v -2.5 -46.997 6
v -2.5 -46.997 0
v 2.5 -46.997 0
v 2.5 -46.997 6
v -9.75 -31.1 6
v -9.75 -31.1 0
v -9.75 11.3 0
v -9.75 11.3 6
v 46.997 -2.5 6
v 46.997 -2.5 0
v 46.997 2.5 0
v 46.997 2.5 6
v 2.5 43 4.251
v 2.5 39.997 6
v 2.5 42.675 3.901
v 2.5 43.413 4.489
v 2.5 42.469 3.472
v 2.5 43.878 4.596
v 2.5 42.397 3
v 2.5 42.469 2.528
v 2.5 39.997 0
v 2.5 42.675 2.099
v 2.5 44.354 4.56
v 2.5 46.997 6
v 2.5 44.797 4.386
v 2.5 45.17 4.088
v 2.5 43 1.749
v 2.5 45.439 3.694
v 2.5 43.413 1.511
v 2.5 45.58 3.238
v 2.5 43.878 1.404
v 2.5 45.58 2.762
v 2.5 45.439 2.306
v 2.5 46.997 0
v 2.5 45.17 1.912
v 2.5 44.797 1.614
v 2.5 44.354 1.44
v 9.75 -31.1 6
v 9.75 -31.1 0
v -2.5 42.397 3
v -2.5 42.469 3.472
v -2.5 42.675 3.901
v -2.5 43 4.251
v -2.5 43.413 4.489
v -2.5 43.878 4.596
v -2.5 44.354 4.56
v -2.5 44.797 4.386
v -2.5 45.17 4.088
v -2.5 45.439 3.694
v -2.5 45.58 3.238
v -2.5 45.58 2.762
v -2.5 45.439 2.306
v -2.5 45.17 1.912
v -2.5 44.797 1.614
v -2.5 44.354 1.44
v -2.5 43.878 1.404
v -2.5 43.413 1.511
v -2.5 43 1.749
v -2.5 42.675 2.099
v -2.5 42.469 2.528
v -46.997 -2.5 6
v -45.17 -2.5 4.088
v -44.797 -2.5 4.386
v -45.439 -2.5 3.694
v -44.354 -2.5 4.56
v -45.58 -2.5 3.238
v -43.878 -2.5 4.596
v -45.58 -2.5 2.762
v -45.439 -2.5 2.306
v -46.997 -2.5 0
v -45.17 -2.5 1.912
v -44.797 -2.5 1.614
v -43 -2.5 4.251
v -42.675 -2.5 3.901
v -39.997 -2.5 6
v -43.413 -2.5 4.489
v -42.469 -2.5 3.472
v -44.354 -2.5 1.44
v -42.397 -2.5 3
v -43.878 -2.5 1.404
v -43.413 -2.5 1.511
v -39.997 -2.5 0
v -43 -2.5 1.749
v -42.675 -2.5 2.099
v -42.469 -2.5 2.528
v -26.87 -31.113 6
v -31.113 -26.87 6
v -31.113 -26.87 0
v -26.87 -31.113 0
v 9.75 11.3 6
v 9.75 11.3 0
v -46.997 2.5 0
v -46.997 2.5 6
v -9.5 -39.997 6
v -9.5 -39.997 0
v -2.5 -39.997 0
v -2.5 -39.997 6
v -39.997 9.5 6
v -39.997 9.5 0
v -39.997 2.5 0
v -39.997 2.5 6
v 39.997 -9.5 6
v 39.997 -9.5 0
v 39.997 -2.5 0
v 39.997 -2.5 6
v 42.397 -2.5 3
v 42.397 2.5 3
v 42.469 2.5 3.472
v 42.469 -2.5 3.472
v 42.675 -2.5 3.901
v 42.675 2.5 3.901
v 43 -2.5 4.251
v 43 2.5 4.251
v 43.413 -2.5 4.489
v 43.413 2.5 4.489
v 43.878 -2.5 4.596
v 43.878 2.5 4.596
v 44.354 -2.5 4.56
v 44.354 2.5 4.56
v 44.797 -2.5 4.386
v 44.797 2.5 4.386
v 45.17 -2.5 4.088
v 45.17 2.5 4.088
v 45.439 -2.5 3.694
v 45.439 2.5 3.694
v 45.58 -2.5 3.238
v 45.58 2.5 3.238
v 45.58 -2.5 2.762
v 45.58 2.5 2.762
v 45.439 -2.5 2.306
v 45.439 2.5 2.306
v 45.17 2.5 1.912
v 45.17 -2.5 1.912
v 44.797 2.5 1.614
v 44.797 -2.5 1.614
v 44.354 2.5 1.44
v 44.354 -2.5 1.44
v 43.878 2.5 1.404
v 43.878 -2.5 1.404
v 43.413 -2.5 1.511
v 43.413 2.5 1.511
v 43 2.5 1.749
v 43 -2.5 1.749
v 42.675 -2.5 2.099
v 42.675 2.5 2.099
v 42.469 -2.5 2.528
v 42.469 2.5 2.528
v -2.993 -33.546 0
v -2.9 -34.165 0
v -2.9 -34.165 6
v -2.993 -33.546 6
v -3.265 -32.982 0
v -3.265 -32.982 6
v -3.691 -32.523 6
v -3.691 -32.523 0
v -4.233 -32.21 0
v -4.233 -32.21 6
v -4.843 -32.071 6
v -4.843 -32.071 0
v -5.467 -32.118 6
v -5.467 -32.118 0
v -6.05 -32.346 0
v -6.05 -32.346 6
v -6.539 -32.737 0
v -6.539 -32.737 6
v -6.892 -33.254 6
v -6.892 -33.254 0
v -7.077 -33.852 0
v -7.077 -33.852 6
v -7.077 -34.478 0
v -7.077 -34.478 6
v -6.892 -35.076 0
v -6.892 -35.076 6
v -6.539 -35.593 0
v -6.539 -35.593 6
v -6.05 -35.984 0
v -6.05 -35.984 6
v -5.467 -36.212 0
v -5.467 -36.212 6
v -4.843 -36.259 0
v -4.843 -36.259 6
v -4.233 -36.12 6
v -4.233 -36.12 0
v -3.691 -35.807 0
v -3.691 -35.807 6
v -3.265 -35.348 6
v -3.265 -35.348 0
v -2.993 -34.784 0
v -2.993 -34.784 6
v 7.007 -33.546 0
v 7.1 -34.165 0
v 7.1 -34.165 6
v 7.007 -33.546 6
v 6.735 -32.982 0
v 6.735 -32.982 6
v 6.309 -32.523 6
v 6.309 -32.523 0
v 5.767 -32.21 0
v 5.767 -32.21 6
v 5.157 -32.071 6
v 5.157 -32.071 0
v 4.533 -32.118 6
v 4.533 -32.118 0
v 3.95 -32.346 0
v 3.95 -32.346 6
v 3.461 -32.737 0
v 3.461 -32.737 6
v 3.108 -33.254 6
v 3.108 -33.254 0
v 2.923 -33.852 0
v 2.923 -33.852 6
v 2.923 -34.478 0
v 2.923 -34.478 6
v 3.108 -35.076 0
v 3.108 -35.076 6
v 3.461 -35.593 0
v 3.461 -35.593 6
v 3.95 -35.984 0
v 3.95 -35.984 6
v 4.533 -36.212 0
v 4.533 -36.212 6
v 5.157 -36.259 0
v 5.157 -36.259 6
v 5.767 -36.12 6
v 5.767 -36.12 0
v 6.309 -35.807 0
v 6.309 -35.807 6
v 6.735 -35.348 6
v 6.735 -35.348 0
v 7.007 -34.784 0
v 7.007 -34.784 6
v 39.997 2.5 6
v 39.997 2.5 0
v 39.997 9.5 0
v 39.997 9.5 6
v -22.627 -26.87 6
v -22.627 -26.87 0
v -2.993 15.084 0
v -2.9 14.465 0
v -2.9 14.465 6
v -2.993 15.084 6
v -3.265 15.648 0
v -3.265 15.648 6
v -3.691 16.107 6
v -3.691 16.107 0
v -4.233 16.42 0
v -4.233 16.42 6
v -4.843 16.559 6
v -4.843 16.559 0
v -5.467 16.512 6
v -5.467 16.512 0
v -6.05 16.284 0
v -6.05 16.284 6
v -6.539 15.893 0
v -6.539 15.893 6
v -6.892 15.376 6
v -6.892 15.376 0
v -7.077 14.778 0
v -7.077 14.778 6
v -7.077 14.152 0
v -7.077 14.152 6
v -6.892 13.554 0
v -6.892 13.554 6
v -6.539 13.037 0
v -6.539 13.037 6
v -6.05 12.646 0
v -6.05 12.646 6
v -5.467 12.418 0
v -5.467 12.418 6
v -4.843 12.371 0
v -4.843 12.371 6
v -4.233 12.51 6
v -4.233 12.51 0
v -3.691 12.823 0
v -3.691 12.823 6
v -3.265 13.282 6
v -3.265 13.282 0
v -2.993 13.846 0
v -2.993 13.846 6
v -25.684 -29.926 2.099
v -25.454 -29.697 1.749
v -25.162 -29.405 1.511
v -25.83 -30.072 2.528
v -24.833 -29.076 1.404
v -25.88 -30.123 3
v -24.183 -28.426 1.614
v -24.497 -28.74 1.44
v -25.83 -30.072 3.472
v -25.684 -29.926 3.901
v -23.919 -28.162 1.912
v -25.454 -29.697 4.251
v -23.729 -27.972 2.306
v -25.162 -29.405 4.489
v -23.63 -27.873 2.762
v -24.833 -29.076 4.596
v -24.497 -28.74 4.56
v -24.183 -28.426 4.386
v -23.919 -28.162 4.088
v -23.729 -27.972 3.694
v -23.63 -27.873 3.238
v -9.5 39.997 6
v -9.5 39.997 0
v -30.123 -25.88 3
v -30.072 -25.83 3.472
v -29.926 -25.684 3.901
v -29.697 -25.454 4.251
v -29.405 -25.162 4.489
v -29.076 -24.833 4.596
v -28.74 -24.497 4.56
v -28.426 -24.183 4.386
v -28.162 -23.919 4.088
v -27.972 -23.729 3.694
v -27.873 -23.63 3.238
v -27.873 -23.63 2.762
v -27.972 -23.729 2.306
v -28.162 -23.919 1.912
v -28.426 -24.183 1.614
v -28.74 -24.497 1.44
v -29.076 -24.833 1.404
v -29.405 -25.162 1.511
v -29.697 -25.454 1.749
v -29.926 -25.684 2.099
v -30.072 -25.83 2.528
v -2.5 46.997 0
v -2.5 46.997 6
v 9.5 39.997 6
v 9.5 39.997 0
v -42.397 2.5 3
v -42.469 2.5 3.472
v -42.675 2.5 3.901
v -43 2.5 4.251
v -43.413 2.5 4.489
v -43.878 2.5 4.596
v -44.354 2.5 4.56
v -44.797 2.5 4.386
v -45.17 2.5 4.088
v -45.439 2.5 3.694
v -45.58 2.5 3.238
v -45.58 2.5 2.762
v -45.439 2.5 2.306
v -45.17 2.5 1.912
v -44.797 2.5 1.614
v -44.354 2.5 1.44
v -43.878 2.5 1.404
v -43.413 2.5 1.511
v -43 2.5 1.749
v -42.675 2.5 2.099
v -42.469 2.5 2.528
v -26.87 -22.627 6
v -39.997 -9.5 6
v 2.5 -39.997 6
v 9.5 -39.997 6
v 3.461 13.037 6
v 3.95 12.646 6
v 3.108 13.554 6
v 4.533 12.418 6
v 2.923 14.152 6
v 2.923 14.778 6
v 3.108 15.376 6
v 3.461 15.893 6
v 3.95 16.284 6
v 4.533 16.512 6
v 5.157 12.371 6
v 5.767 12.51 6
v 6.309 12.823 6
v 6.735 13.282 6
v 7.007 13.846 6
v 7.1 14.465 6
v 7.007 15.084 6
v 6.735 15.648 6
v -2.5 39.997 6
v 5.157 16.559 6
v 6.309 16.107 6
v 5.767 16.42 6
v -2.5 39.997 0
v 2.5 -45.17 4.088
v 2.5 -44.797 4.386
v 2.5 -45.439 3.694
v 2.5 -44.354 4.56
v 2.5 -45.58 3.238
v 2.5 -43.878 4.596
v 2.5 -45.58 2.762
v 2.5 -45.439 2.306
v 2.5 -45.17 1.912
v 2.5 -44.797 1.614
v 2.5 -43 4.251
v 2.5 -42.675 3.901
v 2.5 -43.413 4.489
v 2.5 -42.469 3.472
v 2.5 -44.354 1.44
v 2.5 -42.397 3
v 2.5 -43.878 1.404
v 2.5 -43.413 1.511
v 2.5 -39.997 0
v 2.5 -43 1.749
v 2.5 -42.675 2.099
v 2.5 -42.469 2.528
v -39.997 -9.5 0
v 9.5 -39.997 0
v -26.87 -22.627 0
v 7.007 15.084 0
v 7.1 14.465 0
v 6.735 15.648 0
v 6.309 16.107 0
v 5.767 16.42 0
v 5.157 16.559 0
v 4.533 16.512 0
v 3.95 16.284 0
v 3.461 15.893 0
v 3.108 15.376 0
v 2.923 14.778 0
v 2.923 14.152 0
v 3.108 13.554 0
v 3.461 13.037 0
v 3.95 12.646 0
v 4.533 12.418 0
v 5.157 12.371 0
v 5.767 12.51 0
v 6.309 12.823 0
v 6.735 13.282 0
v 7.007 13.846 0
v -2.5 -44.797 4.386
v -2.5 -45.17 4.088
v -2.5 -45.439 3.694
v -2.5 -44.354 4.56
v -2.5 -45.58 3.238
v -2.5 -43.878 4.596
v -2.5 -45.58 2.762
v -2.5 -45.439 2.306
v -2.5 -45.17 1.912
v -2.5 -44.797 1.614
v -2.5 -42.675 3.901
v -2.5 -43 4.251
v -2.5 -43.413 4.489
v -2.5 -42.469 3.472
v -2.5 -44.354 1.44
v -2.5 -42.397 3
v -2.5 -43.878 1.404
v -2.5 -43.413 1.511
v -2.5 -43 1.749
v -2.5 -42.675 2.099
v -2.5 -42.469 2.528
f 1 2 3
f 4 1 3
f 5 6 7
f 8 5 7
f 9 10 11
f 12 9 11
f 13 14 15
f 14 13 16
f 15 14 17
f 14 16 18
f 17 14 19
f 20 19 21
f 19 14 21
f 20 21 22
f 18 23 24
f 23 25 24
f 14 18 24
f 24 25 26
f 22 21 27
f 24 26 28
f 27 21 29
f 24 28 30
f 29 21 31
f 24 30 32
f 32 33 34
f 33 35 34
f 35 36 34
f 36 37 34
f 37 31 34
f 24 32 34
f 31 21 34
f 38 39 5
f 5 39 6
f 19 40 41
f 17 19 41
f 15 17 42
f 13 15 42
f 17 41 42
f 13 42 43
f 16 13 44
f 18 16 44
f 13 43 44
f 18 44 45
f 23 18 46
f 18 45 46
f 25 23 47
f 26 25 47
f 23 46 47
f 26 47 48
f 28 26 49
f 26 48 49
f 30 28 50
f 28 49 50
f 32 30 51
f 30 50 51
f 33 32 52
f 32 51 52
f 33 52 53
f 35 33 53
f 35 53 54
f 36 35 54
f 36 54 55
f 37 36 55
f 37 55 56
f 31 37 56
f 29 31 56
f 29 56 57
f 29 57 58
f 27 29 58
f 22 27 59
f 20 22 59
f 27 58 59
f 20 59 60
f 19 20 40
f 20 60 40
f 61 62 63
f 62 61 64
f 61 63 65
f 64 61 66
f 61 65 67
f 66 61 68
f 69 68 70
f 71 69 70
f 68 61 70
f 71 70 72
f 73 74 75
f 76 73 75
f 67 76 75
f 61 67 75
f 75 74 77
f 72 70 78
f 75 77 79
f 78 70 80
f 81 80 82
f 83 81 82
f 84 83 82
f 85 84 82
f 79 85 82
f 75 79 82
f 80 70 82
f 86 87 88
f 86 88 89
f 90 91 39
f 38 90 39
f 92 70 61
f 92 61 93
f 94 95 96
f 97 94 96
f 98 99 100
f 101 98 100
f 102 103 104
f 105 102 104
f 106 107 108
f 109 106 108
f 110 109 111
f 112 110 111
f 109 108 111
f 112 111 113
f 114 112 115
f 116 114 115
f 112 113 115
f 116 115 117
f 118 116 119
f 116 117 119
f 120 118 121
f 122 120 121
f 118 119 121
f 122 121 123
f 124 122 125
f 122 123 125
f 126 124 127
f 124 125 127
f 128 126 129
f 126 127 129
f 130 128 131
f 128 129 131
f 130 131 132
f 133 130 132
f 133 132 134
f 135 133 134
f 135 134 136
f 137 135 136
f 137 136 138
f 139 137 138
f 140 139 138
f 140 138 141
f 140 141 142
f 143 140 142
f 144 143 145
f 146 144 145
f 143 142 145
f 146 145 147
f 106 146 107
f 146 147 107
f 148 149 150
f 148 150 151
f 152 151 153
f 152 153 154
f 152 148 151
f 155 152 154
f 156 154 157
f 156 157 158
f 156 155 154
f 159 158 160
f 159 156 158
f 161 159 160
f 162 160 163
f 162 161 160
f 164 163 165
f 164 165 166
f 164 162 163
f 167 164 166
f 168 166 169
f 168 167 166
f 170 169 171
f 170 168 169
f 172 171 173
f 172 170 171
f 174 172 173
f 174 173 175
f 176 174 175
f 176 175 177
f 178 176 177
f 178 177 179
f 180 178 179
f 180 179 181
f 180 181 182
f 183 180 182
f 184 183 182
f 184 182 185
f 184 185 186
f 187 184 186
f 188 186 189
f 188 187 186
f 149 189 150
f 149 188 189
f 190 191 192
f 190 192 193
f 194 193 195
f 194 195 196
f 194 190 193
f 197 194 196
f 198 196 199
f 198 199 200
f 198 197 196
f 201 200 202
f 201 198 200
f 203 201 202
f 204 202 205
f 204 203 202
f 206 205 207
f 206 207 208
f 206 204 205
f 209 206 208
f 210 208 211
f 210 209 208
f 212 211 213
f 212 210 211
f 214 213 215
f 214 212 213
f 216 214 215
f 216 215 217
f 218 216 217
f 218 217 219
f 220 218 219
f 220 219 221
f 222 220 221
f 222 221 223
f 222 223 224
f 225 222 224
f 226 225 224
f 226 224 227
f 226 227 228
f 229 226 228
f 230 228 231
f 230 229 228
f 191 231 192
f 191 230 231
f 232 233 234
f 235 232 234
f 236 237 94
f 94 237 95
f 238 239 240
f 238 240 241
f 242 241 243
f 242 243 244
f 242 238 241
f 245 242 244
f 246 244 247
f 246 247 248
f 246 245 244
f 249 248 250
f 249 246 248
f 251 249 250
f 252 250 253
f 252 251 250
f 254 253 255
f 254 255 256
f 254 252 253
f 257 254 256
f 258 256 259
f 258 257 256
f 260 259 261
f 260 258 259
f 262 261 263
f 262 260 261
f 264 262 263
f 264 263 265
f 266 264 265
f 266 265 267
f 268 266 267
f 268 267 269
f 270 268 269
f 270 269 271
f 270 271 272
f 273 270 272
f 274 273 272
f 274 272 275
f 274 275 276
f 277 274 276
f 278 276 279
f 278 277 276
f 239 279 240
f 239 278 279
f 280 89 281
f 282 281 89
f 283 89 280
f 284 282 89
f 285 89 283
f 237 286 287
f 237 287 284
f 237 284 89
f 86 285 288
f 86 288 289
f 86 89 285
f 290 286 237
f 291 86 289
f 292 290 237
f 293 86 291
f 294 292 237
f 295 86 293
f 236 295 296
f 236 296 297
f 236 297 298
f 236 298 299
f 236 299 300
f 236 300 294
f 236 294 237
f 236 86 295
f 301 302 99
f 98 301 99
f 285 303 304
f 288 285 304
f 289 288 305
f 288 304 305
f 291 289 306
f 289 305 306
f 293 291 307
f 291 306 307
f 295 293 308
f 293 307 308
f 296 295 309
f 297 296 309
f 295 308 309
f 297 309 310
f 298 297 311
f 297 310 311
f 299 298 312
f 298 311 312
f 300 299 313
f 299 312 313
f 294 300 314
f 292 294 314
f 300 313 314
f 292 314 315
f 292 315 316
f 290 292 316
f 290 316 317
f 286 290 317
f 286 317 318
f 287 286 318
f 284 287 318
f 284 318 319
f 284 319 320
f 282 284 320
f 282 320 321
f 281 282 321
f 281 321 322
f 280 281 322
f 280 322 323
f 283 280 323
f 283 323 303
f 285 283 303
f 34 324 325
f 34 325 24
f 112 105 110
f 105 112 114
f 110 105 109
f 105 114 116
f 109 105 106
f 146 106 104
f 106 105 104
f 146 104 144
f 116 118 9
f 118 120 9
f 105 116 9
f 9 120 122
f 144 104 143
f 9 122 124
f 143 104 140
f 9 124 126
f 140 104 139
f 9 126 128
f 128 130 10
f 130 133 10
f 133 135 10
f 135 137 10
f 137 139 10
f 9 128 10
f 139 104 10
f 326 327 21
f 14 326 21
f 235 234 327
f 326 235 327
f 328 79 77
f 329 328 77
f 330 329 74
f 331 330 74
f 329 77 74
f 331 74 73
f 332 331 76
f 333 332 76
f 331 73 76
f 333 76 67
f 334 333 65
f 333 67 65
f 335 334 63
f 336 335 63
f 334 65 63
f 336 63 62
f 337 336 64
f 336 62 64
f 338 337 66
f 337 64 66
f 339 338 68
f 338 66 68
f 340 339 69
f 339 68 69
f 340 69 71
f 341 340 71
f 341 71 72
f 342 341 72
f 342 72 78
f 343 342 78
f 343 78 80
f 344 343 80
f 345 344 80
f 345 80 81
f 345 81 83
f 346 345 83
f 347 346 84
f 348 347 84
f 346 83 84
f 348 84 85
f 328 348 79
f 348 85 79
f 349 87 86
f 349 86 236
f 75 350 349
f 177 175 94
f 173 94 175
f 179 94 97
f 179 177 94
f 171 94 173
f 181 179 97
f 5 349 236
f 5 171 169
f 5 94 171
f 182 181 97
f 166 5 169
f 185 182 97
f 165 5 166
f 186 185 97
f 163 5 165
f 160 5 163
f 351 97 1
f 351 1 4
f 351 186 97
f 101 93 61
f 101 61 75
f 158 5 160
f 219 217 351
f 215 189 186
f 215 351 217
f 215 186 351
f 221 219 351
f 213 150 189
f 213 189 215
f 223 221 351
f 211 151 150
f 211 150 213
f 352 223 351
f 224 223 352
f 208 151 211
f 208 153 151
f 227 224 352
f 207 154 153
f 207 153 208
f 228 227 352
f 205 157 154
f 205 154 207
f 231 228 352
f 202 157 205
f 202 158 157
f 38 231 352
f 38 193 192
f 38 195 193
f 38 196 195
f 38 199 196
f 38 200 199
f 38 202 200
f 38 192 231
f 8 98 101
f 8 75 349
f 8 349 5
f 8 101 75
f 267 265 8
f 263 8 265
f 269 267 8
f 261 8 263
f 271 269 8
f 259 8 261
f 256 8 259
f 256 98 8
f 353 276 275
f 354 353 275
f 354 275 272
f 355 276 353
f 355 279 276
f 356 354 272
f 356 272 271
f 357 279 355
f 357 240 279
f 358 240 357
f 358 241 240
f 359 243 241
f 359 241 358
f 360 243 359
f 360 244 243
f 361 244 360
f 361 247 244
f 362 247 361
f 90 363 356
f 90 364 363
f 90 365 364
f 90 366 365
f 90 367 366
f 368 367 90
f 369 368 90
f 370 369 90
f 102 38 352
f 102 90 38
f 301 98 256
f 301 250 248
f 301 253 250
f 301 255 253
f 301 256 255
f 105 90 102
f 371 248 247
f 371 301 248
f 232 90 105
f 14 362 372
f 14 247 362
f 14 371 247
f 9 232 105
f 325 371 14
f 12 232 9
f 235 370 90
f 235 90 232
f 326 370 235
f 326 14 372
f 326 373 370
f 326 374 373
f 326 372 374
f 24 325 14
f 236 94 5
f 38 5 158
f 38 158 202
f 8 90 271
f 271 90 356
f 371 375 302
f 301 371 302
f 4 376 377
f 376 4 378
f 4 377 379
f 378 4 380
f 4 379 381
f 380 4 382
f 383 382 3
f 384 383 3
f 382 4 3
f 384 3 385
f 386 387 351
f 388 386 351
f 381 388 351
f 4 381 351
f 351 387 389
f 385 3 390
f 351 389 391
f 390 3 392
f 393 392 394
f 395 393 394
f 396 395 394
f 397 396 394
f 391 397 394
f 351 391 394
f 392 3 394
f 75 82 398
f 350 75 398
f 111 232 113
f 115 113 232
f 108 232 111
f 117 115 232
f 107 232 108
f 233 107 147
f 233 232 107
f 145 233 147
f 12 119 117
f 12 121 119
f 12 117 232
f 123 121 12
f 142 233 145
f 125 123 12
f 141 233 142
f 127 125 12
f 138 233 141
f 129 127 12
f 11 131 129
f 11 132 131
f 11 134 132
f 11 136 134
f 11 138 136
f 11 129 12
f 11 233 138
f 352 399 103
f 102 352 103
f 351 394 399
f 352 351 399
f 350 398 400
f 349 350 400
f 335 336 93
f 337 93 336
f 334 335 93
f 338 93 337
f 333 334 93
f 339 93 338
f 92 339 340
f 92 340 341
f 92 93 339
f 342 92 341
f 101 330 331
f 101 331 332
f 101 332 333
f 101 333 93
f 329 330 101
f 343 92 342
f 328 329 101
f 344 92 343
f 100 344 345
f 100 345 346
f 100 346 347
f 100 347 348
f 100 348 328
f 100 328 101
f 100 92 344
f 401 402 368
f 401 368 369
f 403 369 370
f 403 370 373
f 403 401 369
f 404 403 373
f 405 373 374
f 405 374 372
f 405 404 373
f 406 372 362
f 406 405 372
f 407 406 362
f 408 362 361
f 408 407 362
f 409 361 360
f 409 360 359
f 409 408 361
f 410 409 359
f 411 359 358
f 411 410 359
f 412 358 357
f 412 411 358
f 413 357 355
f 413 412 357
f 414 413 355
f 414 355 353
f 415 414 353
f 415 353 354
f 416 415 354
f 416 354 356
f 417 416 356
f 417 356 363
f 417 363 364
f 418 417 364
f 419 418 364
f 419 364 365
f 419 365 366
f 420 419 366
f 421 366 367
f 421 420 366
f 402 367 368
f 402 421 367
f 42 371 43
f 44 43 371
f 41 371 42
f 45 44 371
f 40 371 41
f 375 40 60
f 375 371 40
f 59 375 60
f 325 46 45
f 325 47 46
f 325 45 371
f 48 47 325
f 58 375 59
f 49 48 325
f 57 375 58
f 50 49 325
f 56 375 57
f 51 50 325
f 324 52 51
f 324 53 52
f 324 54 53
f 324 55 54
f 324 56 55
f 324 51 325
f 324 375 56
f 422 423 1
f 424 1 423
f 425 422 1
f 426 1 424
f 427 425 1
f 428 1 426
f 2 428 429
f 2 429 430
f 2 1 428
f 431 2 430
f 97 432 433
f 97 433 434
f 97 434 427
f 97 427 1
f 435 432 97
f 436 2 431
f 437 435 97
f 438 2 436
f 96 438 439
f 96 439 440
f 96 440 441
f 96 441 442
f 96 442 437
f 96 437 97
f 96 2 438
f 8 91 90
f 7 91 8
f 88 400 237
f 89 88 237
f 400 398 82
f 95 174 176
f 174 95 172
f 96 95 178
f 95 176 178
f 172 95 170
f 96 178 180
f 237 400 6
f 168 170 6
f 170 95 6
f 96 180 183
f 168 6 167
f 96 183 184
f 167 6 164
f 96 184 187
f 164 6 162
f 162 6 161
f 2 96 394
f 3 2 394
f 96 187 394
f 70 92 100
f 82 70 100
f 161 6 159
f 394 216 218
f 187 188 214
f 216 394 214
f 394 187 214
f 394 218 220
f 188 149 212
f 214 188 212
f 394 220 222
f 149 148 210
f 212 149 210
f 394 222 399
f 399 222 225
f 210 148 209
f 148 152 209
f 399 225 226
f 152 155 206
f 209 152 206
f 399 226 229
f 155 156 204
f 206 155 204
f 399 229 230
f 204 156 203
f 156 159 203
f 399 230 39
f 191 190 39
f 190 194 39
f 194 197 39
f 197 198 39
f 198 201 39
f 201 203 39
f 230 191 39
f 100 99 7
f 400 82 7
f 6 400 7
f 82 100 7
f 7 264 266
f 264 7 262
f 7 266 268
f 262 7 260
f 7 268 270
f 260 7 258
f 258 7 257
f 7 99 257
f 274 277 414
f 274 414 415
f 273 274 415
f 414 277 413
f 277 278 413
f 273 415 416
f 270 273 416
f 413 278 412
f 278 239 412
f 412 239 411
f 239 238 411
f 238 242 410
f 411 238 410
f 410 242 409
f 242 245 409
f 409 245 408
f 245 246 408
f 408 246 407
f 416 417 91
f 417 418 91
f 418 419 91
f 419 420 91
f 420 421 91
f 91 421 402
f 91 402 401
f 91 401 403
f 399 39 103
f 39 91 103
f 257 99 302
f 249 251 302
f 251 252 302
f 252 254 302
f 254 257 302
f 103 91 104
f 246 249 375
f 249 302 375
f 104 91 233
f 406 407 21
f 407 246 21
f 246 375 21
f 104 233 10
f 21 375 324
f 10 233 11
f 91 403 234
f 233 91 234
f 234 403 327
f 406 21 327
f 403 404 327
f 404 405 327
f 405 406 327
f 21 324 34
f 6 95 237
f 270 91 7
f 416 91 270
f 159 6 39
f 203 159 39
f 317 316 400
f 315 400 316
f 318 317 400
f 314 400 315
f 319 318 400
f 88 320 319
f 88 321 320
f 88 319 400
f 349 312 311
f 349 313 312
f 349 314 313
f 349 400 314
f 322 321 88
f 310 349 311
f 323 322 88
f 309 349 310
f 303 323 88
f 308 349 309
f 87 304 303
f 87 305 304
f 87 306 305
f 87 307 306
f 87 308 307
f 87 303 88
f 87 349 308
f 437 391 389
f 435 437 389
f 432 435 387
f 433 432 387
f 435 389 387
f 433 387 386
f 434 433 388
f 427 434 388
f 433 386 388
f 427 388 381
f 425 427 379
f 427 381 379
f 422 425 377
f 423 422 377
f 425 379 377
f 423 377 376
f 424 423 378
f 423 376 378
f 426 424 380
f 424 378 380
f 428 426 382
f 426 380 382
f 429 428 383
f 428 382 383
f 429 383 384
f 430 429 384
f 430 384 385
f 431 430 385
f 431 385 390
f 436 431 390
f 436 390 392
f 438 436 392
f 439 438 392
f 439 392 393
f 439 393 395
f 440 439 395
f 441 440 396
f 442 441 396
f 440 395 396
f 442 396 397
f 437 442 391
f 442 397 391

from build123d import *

# Parameters (mm, degrees)
SKETCH_1_R          = 2.1
SKETCH_1_W          = 5
SKETCH_1_H          = 7
SKETCH_1_W_2        = 7
SKETCH_1_H_2        = 5
SKETCH_1_W_3        = 19.5
SKETCH_1_H_3        = 6.75
EXTRUDE_2_DEPTH     = 6
SKETCH_2_R          = 1.6
CUT_EXTRUDE_1_DEPTH = 5
SKETCH_3_R          = 1.6
CUT_EXTRUDE_2_DEPTH = 5
SKETCH_4_R          = 1.6
CUT_EXTRUDE_3_DEPTH = 5
SKETCH_5_R          = 1.6
CUT_EXTRUDE_4_DEPTH = 5
EXTRUDE_3_DEPTH     = 6
SKETCH_7_R          = 1.6
CUT_EXTRUDE_5_DEPTH = 10
SKETCH_8_W          = 19.5
SKETCH_8_H          = 40.4
SKETCH_8_H_2        = 1
CUT_EXTRUDE_6_DEPTH = 10


with BuildPart() as part:
    # 草图1 → 凸台-拉伸2 (new body)
    # profile 1 of 6: a face of its own
    with BuildSketch(Plane.XY):
        Polygon((-9.5, 39.997474683), (-39.997474683, 9.5), (-39.997474683, 2.5), (-39.997474683, -2.5), (-39.997474683, -9.5), (-9.5, -39.997474683), (-2.5, -39.997474683), (2.5, -39.997474683), (9.5, -39.997474683), (39.997474683, -9.5), (39.997474683, -2.5), (39.997474683, 2.5), (39.997474683, 9.5), (9.5, 39.997474683), (2.5, 39.997474683), (-2.5, 39.997474683), align=None)
        Polygon((-9.75, -30.1), (-9.75, 10.3), (9.75, 10.3), (9.75, -30.1), (9.75, -36.85), (-9.75, -36.85), align=None, mode=Mode.SUBTRACT)
        with Locations((-5, 14.465)):
            Circle(SKETCH_1_R, mode=Mode.SUBTRACT)
        with Locations((5, 14.465)):
            Circle(SKETCH_1_R, mode=Mode.SUBTRACT)
    # profile 2 of 6: a face of its own
    with BuildSketch(Plane.XY):
        with Locations((0, 43.497474683)):
            Rectangle(SKETCH_1_W, SKETCH_1_H)
    # profile 3 of 6: a face of its own
    with BuildSketch(Plane.XY):
        with Locations((-43.497474683, 0)):
            Rectangle(SKETCH_1_W_2, SKETCH_1_H_2)
    # profile 4 of 6: a face of its own
    with BuildSketch(Plane.XY):
        with Locations((0, -43.497474683)):
            Rectangle(SKETCH_1_W, SKETCH_1_H)
    # profile 5 of 6: a face of its own
    with BuildSketch(Plane.XY):
        with Locations((43.497474683, 0)):
            Rectangle(SKETCH_1_W_2, SKETCH_1_H_2)
    # profile 6 of 6: a face of its own
    with BuildSketch(Plane.XY):
        with Locations((0, -33.475)):
            Rectangle(SKETCH_1_W_3, SKETCH_1_H_3)
        with Locations((5, -34.165)):
            Circle(SKETCH_1_R, mode=Mode.SUBTRACT)
        with Locations((-5, -34.165)):
            Circle(SKETCH_1_R, mode=Mode.SUBTRACT)
    extrude(amount=EXTRUDE_2_DEPTH)

    # 草图2 → 切除-拉伸1 (cut)
    with BuildSketch(Plane.XZ.offset(2.5)):
        with Locations((-43.997474683, 3)):
            Circle(SKETCH_2_R)
    extrude(amount=-CUT_EXTRUDE_1_DEPTH, mode=Mode.SUBTRACT)

    # 草图3 → 切除-拉伸2 (cut)
    with BuildSketch(Plane(origin=(2.5, 0, 0), x_dir=(0, 0, -1), z_dir=(1, 0, 0))):
        with Locations(Location((-3, -43.997474683, 0), (0, 0, 90))):
            Circle(SKETCH_3_R)
    extrude(amount=-CUT_EXTRUDE_2_DEPTH, mode=Mode.SUBTRACT)

    # 草图4 → 切除-拉伸3 (cut)
    with BuildSketch(Plane(origin=(0, 2.5, 0), x_dir=(1, 0, 0), z_dir=(0, 1, 0))):
        with Locations(Location((43.997474683, -3, 0), (0, 0, 180))):
            Circle(SKETCH_4_R)
    extrude(amount=-CUT_EXTRUDE_3_DEPTH, mode=Mode.SUBTRACT)

    # 草图5 → 切除-拉伸4 (cut)
    with BuildSketch(Plane.ZY.offset(2.5)):
        with Locations(Location((3, 43.997474683, 0), (0, 0, 270))):
            Circle(SKETCH_5_R)
    extrude(amount=-CUT_EXTRUDE_4_DEPTH, mode=Mode.SUBTRACT)

    # 草图6 → 凸台-拉伸3 (add)
    with BuildSketch(Plane.XY.offset(6)):
        Polygon((-26.870057685, -31.112698372), (-22.627416998, -26.870057685), (-26.870057685, -22.627416998), (-31.112698372, -26.870057685), align=None)
    extrude(amount=-EXTRUDE_3_DEPTH)

    # 草图7 → 切除-拉伸5 (cut)
    with BuildSketch(Plane(origin=(-2.121320344, 2.121320344, 0), x_dir=(0, 0, 1), z_dir=(-0.7071067811865485, 0.7071067811865466, 0))):
        with Locations(Location((3, -38, 0), (0, 0, 270))):
            Circle(SKETCH_7_R)
    extrude(amount=-CUT_EXTRUDE_5_DEPTH, mode=Mode.SUBTRACT)

    # 草图8 → 切除-拉伸6 (cut)
    with BuildSketch(Plane(origin=(0, 0, 0), x_dir=(-1, 0, 0), z_dir=(0, 0, -1))):
        with Locations((0, -9.9)):
            Rectangle(SKETCH_8_W, SKETCH_8_H)
        with Locations((0, 10.8)):
            Rectangle(SKETCH_8_W, SKETCH_8_H_2)
        with Locations((0, -30.6)):
            Rectangle(SKETCH_8_W, SKETCH_8_H_2)
    extrude(amount=-CUT_EXTRUDE_6_DEPTH, mode=Mode.SUBTRACT)


solid = part.part
